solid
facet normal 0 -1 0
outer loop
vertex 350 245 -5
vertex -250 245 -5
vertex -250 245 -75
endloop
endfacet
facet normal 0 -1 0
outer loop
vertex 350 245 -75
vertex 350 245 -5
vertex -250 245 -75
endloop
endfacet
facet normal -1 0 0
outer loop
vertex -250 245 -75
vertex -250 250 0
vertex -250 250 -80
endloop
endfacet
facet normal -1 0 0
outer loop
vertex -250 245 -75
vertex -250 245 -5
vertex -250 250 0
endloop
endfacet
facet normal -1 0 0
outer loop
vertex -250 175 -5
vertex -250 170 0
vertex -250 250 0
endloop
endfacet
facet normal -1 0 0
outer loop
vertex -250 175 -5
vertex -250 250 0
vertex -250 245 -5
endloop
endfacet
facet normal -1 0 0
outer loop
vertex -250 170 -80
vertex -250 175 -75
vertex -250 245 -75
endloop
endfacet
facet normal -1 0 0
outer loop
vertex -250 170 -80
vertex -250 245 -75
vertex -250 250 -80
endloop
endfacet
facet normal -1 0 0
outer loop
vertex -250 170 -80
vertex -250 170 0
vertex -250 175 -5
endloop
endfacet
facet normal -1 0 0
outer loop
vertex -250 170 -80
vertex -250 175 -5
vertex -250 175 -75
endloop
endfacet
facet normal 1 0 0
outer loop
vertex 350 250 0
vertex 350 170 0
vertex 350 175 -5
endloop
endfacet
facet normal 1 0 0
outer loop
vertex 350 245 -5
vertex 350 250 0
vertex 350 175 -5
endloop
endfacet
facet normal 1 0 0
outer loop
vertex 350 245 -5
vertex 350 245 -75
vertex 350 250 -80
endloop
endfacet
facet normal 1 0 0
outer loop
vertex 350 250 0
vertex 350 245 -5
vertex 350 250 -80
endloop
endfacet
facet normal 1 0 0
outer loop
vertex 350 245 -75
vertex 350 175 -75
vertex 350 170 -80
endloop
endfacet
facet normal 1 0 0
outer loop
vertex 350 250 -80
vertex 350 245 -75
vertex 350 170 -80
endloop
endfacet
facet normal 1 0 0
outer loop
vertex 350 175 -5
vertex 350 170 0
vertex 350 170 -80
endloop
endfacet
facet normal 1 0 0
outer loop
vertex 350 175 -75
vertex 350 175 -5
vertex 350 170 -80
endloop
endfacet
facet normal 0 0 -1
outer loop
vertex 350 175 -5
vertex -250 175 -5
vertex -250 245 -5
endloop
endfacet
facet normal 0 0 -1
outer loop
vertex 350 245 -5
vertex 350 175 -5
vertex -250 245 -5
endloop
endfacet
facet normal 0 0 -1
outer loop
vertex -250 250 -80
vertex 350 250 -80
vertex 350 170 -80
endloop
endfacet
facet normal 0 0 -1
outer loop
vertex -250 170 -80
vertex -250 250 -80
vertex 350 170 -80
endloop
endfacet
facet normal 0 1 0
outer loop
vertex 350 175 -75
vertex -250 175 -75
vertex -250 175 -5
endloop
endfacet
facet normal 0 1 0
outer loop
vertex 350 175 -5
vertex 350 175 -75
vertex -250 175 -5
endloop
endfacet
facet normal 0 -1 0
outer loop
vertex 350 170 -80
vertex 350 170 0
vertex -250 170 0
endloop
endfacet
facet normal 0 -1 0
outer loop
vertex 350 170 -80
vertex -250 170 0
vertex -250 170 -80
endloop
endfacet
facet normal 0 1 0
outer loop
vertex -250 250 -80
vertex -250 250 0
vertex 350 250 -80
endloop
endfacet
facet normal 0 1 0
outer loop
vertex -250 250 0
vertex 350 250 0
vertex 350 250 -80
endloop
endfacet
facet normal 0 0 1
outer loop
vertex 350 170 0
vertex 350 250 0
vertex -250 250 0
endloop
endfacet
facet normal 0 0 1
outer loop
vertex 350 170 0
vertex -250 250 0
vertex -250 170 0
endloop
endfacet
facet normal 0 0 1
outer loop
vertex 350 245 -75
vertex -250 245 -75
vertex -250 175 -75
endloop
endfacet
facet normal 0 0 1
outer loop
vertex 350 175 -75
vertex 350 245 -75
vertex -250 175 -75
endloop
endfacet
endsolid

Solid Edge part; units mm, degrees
sketch "Sketch1" plane through (0, 0, 0) normal (1, 0, 0) x (0, 1, 0)
  line L0 (250, 0) -> (250, -80)
  line L1 (250, -80) -> (170, -80)
  line L2 (170, 0) -> (170, -80)
  line L3 (250, 0) -> (170, 0)
extrude "Protrusion1" add sketch "Sketch1" against normal up to vertex (250 mm away) and the other way up to vertex (350 mm away)
sketch "Sketch2" plane through (-250, 210, -40) normal (-1, 0, 0) x (0, -1, 0)
  line L0 (-35, 35) -> (-35, -35)
  line L1 (-35, -35) -> (35, -35)
  line L2 (35, -35) -> (35, 35)
  line L3 (35, 35) -> (-35, 35)
extrude "Cutout1" cut sketch "Sketch2" against normal through all
properties material "Fe360"
